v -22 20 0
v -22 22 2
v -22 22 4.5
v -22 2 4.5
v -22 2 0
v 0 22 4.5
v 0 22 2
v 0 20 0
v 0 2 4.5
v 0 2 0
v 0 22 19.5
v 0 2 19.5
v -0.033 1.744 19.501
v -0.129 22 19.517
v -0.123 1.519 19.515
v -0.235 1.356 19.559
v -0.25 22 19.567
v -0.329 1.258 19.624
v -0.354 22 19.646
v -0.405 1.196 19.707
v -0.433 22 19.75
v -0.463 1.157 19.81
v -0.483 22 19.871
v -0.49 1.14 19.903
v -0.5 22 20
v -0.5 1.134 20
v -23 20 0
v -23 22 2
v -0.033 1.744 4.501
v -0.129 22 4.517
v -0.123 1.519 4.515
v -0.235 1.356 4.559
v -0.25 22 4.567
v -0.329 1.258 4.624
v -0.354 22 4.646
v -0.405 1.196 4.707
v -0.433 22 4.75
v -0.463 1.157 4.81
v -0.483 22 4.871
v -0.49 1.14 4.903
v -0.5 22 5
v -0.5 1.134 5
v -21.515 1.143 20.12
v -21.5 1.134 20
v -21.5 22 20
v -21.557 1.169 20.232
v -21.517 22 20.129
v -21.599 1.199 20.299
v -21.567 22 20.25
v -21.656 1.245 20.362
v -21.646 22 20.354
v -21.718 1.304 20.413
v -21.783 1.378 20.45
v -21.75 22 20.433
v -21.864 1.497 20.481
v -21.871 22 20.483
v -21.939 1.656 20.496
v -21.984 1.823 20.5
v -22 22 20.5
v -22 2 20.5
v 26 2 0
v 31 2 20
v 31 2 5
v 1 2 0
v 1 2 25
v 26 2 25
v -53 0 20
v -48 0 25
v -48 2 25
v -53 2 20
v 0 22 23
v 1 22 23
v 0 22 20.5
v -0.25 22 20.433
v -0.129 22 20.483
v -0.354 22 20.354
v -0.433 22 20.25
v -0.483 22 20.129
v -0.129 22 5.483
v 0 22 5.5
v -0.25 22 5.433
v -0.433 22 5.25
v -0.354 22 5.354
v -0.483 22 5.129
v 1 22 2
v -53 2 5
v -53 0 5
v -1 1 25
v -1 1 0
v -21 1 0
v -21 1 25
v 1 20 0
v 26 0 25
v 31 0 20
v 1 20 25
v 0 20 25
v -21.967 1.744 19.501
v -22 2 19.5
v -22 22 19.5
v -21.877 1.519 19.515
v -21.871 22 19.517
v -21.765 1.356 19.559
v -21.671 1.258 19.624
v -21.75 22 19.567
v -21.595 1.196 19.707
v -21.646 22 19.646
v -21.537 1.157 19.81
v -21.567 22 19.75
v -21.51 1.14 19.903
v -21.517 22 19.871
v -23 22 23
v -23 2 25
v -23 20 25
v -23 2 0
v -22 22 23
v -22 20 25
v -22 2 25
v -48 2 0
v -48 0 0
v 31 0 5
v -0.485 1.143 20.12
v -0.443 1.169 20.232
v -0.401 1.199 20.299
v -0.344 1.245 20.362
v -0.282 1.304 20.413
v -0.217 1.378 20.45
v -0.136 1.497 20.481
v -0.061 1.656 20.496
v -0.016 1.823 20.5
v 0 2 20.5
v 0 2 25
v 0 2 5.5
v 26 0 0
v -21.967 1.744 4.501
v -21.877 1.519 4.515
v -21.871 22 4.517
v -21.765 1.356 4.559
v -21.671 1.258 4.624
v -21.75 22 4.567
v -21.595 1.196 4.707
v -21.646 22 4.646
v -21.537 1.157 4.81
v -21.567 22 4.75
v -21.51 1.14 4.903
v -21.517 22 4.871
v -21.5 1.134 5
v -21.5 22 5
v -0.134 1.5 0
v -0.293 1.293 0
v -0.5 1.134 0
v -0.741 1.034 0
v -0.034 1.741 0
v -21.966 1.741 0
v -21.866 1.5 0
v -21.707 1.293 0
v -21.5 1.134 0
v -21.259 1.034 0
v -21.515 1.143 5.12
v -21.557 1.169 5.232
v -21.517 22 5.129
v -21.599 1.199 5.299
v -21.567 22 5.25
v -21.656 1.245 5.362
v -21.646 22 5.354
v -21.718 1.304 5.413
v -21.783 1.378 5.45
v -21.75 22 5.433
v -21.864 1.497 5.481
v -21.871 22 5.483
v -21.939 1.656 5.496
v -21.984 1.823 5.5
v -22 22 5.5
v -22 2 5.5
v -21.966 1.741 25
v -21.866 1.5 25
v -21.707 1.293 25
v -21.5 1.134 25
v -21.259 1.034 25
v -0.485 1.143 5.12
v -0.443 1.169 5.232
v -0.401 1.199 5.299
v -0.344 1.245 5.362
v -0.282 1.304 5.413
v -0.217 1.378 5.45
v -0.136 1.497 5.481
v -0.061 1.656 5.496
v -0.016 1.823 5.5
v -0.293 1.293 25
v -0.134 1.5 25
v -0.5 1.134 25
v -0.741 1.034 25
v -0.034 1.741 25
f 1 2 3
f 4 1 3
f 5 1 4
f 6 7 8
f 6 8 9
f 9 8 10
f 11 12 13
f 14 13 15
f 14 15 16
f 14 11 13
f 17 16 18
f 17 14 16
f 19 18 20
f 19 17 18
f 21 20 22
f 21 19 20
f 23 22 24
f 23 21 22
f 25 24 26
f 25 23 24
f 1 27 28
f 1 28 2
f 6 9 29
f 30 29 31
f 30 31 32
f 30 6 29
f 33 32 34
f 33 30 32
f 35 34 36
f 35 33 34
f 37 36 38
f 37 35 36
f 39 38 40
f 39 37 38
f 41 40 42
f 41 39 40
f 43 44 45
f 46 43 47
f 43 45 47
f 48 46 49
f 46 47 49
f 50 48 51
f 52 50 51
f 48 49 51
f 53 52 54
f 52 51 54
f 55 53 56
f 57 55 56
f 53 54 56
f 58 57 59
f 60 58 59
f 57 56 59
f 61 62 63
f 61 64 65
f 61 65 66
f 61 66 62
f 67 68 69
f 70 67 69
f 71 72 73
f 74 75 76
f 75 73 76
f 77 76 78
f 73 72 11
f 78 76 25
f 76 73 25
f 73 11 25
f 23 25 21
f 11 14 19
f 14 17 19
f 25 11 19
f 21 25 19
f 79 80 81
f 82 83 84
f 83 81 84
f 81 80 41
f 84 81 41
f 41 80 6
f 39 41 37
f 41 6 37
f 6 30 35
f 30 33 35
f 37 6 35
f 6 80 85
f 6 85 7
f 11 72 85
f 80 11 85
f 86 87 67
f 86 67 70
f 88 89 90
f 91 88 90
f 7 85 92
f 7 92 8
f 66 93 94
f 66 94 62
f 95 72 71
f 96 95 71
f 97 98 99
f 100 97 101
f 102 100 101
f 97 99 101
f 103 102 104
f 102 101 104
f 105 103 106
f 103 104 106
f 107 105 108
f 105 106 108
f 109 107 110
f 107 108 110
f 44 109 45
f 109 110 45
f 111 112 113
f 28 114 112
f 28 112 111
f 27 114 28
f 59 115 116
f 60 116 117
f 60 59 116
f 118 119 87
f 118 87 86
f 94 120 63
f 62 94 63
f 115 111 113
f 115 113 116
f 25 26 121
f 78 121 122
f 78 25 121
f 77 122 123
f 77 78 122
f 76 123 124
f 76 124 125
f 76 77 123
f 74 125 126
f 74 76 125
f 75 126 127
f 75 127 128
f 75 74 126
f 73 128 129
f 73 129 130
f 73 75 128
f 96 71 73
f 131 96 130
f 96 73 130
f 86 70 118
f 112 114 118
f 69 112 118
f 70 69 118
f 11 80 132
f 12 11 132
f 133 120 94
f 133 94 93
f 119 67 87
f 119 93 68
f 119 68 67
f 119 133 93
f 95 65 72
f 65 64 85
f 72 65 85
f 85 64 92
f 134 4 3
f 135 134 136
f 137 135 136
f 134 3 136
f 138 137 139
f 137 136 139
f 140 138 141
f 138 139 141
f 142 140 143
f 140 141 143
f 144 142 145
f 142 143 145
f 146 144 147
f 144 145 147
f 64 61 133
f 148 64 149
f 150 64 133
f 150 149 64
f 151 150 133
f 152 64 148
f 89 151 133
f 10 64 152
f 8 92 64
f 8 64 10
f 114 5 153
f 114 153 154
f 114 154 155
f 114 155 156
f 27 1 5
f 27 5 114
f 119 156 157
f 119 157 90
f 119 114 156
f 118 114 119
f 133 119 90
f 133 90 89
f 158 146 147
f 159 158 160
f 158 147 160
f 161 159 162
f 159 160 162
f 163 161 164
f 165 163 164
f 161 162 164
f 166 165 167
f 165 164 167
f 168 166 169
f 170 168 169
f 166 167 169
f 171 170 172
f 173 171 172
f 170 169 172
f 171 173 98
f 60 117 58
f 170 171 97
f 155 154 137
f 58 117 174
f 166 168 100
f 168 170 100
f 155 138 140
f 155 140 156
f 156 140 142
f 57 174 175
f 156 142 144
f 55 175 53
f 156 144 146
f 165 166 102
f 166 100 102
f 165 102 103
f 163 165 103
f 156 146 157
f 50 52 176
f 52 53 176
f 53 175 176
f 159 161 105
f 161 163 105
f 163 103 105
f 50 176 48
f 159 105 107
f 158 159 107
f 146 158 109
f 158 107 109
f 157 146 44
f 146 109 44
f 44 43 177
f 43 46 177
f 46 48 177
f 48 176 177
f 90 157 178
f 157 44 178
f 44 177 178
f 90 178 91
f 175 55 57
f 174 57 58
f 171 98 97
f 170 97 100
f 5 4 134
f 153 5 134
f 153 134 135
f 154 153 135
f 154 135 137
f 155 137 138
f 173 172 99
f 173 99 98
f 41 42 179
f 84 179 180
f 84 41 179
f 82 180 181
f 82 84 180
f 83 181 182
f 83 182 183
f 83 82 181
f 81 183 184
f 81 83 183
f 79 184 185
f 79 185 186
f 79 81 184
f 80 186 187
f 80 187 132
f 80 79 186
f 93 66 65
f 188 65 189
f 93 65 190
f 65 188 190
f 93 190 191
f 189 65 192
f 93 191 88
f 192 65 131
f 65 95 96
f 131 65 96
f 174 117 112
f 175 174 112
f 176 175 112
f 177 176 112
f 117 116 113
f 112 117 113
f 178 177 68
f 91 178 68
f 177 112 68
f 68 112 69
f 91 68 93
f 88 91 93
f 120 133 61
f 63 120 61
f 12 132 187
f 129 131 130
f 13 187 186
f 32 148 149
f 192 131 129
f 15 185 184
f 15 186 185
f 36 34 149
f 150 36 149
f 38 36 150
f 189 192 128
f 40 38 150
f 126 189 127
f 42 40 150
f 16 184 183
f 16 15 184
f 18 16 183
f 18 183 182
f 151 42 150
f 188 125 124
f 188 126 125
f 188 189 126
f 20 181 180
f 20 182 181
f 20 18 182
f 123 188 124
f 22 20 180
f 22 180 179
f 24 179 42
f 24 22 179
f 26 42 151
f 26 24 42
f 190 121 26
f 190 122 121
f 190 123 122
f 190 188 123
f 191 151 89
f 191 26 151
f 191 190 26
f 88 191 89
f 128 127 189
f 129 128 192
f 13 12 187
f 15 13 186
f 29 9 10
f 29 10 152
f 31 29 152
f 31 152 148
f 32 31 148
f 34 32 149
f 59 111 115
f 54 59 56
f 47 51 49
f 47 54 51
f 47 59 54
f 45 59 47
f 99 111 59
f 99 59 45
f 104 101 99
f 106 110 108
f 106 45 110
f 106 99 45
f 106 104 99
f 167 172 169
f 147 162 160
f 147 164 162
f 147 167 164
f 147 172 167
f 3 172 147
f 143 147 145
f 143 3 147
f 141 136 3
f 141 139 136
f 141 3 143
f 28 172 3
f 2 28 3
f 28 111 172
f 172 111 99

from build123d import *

# Parameters (mm, degrees)
F0_W     = 30
F0_H     = 2
F0_W_2   = 11
F0_H_2   = 1
F1_DEPTH = 25
F2_SIZE  = 5
F3_R     = 1
F7_SIZE  = 2


with BuildPart() as f1:
    # F0 (on Top) → F1 (new body)
    with BuildSketch(Plane.XY):
        with Locations((16, 1)):
            Rectangle(F0_W, F0_H)
        Polygon((0, 1), (0, 0), (1, 0), (1, 2), (1, 22), (0, 22), align=None)
        with Locations((-5.5, 0.5)):
            Rectangle(F0_W_2, F0_H_2)
    extrude(amount=F1_DEPTH)

    # F2
    f2_edges = [f1.edges().sort_by_distance(p)[0] for p in [
        (31, 1, 0),
        (31, 1, 25),
    ]]
    chamfer(f2_edges, length=F2_SIZE)

    # F3
    f3_edges = [f1.edges().sort_by_distance(p)[0] for p in [
        (0, 1, 12.5),
    ]]
    fillet(f3_edges, radius=F3_R)

    # F4 (on face) → F5 (join, up to the next surface of F1)
    with BuildSketch(Plane(origin=(0, 22, 0), x_dir=(-1, 0, 0), z_dir=(0, 1, 0))):
        with BuildLine():
            ThreePointArc((0.5, 5), (0.3535533906, 5.3535533906), (0, 5.5))
            Line((0, 5.5), (0, 4.5))
            ThreePointArc((0, 4.5), (0.3535533906, 4.6464466094), (0.5, 5))
        make_face()
        with BuildLine():
            ThreePointArc((0, 19.5), (0.3535533906, 19.6464466094), (0.5, 20))
            ThreePointArc((0.5, 20), (0.3535533906, 20.3535533906), (0, 20.5))
            Line((0, 20.5), (0, 19.5))
        make_face()
    extrude(until=Until.NEXT, dir=(0, -1, 0))

    # F6: F1 across face


with BuildPart() as f1_1:
    add(f1.part)
    add(f1.part.mirror(Plane(origin=(-11, 0.5, 12.5), x_dir=(0, -1, 0), z_dir=(-1, 0, 0))))

    # F7
    f7_edges = [f1_1.edges().sort_by_distance(p)[0] for p in [
        (-22.5, 22, 25),
        (-22.5, 22, 0),
        (0.5, 22, 25),
        (0.5, 22, 0),
    ]]
    chamfer(f7_edges, length=F7_SIZE)


solid = f1_1.part
